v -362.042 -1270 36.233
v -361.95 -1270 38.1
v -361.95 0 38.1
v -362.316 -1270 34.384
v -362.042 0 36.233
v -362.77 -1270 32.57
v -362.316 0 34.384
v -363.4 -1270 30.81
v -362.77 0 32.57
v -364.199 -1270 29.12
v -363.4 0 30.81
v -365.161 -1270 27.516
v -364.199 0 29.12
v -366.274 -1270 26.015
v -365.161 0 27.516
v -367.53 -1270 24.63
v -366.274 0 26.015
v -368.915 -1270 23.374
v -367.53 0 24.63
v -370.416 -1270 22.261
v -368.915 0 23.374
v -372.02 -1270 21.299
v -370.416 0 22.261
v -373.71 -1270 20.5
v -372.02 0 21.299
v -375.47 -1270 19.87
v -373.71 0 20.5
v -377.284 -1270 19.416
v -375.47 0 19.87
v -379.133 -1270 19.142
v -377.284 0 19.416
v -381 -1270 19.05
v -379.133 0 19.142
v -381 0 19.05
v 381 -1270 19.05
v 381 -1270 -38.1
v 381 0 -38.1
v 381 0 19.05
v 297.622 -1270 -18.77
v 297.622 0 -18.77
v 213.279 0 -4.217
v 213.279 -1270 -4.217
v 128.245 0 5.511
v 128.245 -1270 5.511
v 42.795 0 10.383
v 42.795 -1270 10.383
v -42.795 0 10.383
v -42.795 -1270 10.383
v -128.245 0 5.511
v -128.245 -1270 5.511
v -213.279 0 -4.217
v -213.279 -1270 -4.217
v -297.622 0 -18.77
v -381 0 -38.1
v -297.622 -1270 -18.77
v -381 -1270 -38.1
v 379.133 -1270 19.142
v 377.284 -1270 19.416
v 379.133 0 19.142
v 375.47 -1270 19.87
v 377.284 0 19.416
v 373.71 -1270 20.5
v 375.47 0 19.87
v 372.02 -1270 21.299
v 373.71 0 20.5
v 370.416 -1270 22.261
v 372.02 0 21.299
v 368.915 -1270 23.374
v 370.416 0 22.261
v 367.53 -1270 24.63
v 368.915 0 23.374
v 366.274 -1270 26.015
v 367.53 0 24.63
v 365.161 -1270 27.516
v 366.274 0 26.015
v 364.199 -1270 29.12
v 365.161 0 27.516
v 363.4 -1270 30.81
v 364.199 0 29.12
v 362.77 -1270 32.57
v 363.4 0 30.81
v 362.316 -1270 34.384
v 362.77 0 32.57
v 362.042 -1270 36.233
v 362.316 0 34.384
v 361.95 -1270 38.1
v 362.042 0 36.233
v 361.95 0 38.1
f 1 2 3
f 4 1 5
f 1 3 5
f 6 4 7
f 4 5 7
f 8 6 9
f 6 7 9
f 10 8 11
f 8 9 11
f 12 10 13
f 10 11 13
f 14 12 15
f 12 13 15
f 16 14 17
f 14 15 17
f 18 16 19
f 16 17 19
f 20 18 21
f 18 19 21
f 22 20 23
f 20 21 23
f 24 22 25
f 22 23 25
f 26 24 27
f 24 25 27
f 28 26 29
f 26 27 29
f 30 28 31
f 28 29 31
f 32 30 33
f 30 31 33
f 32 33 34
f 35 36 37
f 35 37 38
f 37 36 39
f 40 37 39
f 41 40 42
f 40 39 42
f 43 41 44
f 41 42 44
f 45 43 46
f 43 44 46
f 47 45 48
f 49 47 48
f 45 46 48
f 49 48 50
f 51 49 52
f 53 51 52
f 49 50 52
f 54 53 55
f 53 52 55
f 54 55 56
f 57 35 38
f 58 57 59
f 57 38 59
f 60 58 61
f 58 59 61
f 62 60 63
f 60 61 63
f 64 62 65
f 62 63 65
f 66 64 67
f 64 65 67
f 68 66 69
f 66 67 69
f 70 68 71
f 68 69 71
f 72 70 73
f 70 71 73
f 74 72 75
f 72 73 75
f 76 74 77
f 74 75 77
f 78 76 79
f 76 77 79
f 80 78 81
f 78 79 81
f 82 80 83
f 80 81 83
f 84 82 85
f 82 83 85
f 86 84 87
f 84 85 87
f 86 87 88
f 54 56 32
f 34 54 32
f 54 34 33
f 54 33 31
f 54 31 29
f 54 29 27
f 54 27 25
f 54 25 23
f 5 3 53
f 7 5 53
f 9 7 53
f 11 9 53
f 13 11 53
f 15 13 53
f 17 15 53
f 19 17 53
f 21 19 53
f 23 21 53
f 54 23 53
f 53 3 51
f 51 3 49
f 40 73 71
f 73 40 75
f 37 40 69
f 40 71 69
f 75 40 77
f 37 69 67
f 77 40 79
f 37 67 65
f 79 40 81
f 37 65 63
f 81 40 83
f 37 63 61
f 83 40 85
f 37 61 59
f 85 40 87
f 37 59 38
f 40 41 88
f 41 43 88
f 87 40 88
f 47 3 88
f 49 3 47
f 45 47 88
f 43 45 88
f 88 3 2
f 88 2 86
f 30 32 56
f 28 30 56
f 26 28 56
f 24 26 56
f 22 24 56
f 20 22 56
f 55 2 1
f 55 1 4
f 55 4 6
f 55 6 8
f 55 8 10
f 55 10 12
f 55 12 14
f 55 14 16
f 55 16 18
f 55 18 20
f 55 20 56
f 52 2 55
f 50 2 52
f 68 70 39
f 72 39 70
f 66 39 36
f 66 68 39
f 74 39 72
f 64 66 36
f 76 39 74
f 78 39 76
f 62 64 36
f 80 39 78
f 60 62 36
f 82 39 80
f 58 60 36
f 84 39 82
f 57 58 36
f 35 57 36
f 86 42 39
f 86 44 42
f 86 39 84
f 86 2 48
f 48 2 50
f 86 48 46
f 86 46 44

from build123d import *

# Parameters (mm, degrees)
F0_W     = 762
F0_H     = 76.2
F1_DEPTH = 1270
F2_R     = 12.7
F2_R_2   = 38.1
F3_DEPTH = 25.4
F5_DEPTH = 1270.001
F6_R     = 19.05
F7_DEPTH = 1270.001


with BuildPart() as f1:
    # F0 (on Front) → F1 (new body)
    with BuildSketch(Plane.XZ):
        Rectangle(F0_W, F0_H)
    extrude(amount=F1_DEPTH)

    # F2 (on face) → F3 (cut)
    with BuildSketch(Plane(origin=(0, 0, -38.1), x_dir=(1, 0, 0), z_dir=(0, 0, -1))):
        with Locations((0, 1231.9)):
            Circle(F2_R)
        with Locations((0, 38.1)):
            Circle(F2_R)
        with Locations((0, 876.3)):
            Circle(F2_R_2)
        with Locations((0, 393.7)):
            Circle(F2_R_2)
    extrude(amount=-F3_DEPTH, mode=Mode.SUBTRACT)

    # F4 (on face) → F5 (cut, through all)
    with BuildSketch(Plane.XZ.offset(1270)):
        with BuildLine():
            Line((-381, -38.1), (381, -38.1))
            ThreePointArc((381, -38.1), (0, 10.991921), (-381, -38.1))
        make_face()
    extrude(amount=-F5_DEPTH, mode=Mode.SUBTRACT)

    # F6 (on face) → F7 (cut, through all)
    with BuildSketch(Plane(origin=(0, 0, 0), x_dir=(-1, 0, 0), z_dir=(0, 1, 0))):
        with Locations((-381, 38.1)):
            Circle(F6_R)
        with Locations((381, 38.1)):
            Circle(F6_R)
    extrude(amount=-F7_DEPTH, mode=Mode.SUBTRACT)


solid = f1.part
